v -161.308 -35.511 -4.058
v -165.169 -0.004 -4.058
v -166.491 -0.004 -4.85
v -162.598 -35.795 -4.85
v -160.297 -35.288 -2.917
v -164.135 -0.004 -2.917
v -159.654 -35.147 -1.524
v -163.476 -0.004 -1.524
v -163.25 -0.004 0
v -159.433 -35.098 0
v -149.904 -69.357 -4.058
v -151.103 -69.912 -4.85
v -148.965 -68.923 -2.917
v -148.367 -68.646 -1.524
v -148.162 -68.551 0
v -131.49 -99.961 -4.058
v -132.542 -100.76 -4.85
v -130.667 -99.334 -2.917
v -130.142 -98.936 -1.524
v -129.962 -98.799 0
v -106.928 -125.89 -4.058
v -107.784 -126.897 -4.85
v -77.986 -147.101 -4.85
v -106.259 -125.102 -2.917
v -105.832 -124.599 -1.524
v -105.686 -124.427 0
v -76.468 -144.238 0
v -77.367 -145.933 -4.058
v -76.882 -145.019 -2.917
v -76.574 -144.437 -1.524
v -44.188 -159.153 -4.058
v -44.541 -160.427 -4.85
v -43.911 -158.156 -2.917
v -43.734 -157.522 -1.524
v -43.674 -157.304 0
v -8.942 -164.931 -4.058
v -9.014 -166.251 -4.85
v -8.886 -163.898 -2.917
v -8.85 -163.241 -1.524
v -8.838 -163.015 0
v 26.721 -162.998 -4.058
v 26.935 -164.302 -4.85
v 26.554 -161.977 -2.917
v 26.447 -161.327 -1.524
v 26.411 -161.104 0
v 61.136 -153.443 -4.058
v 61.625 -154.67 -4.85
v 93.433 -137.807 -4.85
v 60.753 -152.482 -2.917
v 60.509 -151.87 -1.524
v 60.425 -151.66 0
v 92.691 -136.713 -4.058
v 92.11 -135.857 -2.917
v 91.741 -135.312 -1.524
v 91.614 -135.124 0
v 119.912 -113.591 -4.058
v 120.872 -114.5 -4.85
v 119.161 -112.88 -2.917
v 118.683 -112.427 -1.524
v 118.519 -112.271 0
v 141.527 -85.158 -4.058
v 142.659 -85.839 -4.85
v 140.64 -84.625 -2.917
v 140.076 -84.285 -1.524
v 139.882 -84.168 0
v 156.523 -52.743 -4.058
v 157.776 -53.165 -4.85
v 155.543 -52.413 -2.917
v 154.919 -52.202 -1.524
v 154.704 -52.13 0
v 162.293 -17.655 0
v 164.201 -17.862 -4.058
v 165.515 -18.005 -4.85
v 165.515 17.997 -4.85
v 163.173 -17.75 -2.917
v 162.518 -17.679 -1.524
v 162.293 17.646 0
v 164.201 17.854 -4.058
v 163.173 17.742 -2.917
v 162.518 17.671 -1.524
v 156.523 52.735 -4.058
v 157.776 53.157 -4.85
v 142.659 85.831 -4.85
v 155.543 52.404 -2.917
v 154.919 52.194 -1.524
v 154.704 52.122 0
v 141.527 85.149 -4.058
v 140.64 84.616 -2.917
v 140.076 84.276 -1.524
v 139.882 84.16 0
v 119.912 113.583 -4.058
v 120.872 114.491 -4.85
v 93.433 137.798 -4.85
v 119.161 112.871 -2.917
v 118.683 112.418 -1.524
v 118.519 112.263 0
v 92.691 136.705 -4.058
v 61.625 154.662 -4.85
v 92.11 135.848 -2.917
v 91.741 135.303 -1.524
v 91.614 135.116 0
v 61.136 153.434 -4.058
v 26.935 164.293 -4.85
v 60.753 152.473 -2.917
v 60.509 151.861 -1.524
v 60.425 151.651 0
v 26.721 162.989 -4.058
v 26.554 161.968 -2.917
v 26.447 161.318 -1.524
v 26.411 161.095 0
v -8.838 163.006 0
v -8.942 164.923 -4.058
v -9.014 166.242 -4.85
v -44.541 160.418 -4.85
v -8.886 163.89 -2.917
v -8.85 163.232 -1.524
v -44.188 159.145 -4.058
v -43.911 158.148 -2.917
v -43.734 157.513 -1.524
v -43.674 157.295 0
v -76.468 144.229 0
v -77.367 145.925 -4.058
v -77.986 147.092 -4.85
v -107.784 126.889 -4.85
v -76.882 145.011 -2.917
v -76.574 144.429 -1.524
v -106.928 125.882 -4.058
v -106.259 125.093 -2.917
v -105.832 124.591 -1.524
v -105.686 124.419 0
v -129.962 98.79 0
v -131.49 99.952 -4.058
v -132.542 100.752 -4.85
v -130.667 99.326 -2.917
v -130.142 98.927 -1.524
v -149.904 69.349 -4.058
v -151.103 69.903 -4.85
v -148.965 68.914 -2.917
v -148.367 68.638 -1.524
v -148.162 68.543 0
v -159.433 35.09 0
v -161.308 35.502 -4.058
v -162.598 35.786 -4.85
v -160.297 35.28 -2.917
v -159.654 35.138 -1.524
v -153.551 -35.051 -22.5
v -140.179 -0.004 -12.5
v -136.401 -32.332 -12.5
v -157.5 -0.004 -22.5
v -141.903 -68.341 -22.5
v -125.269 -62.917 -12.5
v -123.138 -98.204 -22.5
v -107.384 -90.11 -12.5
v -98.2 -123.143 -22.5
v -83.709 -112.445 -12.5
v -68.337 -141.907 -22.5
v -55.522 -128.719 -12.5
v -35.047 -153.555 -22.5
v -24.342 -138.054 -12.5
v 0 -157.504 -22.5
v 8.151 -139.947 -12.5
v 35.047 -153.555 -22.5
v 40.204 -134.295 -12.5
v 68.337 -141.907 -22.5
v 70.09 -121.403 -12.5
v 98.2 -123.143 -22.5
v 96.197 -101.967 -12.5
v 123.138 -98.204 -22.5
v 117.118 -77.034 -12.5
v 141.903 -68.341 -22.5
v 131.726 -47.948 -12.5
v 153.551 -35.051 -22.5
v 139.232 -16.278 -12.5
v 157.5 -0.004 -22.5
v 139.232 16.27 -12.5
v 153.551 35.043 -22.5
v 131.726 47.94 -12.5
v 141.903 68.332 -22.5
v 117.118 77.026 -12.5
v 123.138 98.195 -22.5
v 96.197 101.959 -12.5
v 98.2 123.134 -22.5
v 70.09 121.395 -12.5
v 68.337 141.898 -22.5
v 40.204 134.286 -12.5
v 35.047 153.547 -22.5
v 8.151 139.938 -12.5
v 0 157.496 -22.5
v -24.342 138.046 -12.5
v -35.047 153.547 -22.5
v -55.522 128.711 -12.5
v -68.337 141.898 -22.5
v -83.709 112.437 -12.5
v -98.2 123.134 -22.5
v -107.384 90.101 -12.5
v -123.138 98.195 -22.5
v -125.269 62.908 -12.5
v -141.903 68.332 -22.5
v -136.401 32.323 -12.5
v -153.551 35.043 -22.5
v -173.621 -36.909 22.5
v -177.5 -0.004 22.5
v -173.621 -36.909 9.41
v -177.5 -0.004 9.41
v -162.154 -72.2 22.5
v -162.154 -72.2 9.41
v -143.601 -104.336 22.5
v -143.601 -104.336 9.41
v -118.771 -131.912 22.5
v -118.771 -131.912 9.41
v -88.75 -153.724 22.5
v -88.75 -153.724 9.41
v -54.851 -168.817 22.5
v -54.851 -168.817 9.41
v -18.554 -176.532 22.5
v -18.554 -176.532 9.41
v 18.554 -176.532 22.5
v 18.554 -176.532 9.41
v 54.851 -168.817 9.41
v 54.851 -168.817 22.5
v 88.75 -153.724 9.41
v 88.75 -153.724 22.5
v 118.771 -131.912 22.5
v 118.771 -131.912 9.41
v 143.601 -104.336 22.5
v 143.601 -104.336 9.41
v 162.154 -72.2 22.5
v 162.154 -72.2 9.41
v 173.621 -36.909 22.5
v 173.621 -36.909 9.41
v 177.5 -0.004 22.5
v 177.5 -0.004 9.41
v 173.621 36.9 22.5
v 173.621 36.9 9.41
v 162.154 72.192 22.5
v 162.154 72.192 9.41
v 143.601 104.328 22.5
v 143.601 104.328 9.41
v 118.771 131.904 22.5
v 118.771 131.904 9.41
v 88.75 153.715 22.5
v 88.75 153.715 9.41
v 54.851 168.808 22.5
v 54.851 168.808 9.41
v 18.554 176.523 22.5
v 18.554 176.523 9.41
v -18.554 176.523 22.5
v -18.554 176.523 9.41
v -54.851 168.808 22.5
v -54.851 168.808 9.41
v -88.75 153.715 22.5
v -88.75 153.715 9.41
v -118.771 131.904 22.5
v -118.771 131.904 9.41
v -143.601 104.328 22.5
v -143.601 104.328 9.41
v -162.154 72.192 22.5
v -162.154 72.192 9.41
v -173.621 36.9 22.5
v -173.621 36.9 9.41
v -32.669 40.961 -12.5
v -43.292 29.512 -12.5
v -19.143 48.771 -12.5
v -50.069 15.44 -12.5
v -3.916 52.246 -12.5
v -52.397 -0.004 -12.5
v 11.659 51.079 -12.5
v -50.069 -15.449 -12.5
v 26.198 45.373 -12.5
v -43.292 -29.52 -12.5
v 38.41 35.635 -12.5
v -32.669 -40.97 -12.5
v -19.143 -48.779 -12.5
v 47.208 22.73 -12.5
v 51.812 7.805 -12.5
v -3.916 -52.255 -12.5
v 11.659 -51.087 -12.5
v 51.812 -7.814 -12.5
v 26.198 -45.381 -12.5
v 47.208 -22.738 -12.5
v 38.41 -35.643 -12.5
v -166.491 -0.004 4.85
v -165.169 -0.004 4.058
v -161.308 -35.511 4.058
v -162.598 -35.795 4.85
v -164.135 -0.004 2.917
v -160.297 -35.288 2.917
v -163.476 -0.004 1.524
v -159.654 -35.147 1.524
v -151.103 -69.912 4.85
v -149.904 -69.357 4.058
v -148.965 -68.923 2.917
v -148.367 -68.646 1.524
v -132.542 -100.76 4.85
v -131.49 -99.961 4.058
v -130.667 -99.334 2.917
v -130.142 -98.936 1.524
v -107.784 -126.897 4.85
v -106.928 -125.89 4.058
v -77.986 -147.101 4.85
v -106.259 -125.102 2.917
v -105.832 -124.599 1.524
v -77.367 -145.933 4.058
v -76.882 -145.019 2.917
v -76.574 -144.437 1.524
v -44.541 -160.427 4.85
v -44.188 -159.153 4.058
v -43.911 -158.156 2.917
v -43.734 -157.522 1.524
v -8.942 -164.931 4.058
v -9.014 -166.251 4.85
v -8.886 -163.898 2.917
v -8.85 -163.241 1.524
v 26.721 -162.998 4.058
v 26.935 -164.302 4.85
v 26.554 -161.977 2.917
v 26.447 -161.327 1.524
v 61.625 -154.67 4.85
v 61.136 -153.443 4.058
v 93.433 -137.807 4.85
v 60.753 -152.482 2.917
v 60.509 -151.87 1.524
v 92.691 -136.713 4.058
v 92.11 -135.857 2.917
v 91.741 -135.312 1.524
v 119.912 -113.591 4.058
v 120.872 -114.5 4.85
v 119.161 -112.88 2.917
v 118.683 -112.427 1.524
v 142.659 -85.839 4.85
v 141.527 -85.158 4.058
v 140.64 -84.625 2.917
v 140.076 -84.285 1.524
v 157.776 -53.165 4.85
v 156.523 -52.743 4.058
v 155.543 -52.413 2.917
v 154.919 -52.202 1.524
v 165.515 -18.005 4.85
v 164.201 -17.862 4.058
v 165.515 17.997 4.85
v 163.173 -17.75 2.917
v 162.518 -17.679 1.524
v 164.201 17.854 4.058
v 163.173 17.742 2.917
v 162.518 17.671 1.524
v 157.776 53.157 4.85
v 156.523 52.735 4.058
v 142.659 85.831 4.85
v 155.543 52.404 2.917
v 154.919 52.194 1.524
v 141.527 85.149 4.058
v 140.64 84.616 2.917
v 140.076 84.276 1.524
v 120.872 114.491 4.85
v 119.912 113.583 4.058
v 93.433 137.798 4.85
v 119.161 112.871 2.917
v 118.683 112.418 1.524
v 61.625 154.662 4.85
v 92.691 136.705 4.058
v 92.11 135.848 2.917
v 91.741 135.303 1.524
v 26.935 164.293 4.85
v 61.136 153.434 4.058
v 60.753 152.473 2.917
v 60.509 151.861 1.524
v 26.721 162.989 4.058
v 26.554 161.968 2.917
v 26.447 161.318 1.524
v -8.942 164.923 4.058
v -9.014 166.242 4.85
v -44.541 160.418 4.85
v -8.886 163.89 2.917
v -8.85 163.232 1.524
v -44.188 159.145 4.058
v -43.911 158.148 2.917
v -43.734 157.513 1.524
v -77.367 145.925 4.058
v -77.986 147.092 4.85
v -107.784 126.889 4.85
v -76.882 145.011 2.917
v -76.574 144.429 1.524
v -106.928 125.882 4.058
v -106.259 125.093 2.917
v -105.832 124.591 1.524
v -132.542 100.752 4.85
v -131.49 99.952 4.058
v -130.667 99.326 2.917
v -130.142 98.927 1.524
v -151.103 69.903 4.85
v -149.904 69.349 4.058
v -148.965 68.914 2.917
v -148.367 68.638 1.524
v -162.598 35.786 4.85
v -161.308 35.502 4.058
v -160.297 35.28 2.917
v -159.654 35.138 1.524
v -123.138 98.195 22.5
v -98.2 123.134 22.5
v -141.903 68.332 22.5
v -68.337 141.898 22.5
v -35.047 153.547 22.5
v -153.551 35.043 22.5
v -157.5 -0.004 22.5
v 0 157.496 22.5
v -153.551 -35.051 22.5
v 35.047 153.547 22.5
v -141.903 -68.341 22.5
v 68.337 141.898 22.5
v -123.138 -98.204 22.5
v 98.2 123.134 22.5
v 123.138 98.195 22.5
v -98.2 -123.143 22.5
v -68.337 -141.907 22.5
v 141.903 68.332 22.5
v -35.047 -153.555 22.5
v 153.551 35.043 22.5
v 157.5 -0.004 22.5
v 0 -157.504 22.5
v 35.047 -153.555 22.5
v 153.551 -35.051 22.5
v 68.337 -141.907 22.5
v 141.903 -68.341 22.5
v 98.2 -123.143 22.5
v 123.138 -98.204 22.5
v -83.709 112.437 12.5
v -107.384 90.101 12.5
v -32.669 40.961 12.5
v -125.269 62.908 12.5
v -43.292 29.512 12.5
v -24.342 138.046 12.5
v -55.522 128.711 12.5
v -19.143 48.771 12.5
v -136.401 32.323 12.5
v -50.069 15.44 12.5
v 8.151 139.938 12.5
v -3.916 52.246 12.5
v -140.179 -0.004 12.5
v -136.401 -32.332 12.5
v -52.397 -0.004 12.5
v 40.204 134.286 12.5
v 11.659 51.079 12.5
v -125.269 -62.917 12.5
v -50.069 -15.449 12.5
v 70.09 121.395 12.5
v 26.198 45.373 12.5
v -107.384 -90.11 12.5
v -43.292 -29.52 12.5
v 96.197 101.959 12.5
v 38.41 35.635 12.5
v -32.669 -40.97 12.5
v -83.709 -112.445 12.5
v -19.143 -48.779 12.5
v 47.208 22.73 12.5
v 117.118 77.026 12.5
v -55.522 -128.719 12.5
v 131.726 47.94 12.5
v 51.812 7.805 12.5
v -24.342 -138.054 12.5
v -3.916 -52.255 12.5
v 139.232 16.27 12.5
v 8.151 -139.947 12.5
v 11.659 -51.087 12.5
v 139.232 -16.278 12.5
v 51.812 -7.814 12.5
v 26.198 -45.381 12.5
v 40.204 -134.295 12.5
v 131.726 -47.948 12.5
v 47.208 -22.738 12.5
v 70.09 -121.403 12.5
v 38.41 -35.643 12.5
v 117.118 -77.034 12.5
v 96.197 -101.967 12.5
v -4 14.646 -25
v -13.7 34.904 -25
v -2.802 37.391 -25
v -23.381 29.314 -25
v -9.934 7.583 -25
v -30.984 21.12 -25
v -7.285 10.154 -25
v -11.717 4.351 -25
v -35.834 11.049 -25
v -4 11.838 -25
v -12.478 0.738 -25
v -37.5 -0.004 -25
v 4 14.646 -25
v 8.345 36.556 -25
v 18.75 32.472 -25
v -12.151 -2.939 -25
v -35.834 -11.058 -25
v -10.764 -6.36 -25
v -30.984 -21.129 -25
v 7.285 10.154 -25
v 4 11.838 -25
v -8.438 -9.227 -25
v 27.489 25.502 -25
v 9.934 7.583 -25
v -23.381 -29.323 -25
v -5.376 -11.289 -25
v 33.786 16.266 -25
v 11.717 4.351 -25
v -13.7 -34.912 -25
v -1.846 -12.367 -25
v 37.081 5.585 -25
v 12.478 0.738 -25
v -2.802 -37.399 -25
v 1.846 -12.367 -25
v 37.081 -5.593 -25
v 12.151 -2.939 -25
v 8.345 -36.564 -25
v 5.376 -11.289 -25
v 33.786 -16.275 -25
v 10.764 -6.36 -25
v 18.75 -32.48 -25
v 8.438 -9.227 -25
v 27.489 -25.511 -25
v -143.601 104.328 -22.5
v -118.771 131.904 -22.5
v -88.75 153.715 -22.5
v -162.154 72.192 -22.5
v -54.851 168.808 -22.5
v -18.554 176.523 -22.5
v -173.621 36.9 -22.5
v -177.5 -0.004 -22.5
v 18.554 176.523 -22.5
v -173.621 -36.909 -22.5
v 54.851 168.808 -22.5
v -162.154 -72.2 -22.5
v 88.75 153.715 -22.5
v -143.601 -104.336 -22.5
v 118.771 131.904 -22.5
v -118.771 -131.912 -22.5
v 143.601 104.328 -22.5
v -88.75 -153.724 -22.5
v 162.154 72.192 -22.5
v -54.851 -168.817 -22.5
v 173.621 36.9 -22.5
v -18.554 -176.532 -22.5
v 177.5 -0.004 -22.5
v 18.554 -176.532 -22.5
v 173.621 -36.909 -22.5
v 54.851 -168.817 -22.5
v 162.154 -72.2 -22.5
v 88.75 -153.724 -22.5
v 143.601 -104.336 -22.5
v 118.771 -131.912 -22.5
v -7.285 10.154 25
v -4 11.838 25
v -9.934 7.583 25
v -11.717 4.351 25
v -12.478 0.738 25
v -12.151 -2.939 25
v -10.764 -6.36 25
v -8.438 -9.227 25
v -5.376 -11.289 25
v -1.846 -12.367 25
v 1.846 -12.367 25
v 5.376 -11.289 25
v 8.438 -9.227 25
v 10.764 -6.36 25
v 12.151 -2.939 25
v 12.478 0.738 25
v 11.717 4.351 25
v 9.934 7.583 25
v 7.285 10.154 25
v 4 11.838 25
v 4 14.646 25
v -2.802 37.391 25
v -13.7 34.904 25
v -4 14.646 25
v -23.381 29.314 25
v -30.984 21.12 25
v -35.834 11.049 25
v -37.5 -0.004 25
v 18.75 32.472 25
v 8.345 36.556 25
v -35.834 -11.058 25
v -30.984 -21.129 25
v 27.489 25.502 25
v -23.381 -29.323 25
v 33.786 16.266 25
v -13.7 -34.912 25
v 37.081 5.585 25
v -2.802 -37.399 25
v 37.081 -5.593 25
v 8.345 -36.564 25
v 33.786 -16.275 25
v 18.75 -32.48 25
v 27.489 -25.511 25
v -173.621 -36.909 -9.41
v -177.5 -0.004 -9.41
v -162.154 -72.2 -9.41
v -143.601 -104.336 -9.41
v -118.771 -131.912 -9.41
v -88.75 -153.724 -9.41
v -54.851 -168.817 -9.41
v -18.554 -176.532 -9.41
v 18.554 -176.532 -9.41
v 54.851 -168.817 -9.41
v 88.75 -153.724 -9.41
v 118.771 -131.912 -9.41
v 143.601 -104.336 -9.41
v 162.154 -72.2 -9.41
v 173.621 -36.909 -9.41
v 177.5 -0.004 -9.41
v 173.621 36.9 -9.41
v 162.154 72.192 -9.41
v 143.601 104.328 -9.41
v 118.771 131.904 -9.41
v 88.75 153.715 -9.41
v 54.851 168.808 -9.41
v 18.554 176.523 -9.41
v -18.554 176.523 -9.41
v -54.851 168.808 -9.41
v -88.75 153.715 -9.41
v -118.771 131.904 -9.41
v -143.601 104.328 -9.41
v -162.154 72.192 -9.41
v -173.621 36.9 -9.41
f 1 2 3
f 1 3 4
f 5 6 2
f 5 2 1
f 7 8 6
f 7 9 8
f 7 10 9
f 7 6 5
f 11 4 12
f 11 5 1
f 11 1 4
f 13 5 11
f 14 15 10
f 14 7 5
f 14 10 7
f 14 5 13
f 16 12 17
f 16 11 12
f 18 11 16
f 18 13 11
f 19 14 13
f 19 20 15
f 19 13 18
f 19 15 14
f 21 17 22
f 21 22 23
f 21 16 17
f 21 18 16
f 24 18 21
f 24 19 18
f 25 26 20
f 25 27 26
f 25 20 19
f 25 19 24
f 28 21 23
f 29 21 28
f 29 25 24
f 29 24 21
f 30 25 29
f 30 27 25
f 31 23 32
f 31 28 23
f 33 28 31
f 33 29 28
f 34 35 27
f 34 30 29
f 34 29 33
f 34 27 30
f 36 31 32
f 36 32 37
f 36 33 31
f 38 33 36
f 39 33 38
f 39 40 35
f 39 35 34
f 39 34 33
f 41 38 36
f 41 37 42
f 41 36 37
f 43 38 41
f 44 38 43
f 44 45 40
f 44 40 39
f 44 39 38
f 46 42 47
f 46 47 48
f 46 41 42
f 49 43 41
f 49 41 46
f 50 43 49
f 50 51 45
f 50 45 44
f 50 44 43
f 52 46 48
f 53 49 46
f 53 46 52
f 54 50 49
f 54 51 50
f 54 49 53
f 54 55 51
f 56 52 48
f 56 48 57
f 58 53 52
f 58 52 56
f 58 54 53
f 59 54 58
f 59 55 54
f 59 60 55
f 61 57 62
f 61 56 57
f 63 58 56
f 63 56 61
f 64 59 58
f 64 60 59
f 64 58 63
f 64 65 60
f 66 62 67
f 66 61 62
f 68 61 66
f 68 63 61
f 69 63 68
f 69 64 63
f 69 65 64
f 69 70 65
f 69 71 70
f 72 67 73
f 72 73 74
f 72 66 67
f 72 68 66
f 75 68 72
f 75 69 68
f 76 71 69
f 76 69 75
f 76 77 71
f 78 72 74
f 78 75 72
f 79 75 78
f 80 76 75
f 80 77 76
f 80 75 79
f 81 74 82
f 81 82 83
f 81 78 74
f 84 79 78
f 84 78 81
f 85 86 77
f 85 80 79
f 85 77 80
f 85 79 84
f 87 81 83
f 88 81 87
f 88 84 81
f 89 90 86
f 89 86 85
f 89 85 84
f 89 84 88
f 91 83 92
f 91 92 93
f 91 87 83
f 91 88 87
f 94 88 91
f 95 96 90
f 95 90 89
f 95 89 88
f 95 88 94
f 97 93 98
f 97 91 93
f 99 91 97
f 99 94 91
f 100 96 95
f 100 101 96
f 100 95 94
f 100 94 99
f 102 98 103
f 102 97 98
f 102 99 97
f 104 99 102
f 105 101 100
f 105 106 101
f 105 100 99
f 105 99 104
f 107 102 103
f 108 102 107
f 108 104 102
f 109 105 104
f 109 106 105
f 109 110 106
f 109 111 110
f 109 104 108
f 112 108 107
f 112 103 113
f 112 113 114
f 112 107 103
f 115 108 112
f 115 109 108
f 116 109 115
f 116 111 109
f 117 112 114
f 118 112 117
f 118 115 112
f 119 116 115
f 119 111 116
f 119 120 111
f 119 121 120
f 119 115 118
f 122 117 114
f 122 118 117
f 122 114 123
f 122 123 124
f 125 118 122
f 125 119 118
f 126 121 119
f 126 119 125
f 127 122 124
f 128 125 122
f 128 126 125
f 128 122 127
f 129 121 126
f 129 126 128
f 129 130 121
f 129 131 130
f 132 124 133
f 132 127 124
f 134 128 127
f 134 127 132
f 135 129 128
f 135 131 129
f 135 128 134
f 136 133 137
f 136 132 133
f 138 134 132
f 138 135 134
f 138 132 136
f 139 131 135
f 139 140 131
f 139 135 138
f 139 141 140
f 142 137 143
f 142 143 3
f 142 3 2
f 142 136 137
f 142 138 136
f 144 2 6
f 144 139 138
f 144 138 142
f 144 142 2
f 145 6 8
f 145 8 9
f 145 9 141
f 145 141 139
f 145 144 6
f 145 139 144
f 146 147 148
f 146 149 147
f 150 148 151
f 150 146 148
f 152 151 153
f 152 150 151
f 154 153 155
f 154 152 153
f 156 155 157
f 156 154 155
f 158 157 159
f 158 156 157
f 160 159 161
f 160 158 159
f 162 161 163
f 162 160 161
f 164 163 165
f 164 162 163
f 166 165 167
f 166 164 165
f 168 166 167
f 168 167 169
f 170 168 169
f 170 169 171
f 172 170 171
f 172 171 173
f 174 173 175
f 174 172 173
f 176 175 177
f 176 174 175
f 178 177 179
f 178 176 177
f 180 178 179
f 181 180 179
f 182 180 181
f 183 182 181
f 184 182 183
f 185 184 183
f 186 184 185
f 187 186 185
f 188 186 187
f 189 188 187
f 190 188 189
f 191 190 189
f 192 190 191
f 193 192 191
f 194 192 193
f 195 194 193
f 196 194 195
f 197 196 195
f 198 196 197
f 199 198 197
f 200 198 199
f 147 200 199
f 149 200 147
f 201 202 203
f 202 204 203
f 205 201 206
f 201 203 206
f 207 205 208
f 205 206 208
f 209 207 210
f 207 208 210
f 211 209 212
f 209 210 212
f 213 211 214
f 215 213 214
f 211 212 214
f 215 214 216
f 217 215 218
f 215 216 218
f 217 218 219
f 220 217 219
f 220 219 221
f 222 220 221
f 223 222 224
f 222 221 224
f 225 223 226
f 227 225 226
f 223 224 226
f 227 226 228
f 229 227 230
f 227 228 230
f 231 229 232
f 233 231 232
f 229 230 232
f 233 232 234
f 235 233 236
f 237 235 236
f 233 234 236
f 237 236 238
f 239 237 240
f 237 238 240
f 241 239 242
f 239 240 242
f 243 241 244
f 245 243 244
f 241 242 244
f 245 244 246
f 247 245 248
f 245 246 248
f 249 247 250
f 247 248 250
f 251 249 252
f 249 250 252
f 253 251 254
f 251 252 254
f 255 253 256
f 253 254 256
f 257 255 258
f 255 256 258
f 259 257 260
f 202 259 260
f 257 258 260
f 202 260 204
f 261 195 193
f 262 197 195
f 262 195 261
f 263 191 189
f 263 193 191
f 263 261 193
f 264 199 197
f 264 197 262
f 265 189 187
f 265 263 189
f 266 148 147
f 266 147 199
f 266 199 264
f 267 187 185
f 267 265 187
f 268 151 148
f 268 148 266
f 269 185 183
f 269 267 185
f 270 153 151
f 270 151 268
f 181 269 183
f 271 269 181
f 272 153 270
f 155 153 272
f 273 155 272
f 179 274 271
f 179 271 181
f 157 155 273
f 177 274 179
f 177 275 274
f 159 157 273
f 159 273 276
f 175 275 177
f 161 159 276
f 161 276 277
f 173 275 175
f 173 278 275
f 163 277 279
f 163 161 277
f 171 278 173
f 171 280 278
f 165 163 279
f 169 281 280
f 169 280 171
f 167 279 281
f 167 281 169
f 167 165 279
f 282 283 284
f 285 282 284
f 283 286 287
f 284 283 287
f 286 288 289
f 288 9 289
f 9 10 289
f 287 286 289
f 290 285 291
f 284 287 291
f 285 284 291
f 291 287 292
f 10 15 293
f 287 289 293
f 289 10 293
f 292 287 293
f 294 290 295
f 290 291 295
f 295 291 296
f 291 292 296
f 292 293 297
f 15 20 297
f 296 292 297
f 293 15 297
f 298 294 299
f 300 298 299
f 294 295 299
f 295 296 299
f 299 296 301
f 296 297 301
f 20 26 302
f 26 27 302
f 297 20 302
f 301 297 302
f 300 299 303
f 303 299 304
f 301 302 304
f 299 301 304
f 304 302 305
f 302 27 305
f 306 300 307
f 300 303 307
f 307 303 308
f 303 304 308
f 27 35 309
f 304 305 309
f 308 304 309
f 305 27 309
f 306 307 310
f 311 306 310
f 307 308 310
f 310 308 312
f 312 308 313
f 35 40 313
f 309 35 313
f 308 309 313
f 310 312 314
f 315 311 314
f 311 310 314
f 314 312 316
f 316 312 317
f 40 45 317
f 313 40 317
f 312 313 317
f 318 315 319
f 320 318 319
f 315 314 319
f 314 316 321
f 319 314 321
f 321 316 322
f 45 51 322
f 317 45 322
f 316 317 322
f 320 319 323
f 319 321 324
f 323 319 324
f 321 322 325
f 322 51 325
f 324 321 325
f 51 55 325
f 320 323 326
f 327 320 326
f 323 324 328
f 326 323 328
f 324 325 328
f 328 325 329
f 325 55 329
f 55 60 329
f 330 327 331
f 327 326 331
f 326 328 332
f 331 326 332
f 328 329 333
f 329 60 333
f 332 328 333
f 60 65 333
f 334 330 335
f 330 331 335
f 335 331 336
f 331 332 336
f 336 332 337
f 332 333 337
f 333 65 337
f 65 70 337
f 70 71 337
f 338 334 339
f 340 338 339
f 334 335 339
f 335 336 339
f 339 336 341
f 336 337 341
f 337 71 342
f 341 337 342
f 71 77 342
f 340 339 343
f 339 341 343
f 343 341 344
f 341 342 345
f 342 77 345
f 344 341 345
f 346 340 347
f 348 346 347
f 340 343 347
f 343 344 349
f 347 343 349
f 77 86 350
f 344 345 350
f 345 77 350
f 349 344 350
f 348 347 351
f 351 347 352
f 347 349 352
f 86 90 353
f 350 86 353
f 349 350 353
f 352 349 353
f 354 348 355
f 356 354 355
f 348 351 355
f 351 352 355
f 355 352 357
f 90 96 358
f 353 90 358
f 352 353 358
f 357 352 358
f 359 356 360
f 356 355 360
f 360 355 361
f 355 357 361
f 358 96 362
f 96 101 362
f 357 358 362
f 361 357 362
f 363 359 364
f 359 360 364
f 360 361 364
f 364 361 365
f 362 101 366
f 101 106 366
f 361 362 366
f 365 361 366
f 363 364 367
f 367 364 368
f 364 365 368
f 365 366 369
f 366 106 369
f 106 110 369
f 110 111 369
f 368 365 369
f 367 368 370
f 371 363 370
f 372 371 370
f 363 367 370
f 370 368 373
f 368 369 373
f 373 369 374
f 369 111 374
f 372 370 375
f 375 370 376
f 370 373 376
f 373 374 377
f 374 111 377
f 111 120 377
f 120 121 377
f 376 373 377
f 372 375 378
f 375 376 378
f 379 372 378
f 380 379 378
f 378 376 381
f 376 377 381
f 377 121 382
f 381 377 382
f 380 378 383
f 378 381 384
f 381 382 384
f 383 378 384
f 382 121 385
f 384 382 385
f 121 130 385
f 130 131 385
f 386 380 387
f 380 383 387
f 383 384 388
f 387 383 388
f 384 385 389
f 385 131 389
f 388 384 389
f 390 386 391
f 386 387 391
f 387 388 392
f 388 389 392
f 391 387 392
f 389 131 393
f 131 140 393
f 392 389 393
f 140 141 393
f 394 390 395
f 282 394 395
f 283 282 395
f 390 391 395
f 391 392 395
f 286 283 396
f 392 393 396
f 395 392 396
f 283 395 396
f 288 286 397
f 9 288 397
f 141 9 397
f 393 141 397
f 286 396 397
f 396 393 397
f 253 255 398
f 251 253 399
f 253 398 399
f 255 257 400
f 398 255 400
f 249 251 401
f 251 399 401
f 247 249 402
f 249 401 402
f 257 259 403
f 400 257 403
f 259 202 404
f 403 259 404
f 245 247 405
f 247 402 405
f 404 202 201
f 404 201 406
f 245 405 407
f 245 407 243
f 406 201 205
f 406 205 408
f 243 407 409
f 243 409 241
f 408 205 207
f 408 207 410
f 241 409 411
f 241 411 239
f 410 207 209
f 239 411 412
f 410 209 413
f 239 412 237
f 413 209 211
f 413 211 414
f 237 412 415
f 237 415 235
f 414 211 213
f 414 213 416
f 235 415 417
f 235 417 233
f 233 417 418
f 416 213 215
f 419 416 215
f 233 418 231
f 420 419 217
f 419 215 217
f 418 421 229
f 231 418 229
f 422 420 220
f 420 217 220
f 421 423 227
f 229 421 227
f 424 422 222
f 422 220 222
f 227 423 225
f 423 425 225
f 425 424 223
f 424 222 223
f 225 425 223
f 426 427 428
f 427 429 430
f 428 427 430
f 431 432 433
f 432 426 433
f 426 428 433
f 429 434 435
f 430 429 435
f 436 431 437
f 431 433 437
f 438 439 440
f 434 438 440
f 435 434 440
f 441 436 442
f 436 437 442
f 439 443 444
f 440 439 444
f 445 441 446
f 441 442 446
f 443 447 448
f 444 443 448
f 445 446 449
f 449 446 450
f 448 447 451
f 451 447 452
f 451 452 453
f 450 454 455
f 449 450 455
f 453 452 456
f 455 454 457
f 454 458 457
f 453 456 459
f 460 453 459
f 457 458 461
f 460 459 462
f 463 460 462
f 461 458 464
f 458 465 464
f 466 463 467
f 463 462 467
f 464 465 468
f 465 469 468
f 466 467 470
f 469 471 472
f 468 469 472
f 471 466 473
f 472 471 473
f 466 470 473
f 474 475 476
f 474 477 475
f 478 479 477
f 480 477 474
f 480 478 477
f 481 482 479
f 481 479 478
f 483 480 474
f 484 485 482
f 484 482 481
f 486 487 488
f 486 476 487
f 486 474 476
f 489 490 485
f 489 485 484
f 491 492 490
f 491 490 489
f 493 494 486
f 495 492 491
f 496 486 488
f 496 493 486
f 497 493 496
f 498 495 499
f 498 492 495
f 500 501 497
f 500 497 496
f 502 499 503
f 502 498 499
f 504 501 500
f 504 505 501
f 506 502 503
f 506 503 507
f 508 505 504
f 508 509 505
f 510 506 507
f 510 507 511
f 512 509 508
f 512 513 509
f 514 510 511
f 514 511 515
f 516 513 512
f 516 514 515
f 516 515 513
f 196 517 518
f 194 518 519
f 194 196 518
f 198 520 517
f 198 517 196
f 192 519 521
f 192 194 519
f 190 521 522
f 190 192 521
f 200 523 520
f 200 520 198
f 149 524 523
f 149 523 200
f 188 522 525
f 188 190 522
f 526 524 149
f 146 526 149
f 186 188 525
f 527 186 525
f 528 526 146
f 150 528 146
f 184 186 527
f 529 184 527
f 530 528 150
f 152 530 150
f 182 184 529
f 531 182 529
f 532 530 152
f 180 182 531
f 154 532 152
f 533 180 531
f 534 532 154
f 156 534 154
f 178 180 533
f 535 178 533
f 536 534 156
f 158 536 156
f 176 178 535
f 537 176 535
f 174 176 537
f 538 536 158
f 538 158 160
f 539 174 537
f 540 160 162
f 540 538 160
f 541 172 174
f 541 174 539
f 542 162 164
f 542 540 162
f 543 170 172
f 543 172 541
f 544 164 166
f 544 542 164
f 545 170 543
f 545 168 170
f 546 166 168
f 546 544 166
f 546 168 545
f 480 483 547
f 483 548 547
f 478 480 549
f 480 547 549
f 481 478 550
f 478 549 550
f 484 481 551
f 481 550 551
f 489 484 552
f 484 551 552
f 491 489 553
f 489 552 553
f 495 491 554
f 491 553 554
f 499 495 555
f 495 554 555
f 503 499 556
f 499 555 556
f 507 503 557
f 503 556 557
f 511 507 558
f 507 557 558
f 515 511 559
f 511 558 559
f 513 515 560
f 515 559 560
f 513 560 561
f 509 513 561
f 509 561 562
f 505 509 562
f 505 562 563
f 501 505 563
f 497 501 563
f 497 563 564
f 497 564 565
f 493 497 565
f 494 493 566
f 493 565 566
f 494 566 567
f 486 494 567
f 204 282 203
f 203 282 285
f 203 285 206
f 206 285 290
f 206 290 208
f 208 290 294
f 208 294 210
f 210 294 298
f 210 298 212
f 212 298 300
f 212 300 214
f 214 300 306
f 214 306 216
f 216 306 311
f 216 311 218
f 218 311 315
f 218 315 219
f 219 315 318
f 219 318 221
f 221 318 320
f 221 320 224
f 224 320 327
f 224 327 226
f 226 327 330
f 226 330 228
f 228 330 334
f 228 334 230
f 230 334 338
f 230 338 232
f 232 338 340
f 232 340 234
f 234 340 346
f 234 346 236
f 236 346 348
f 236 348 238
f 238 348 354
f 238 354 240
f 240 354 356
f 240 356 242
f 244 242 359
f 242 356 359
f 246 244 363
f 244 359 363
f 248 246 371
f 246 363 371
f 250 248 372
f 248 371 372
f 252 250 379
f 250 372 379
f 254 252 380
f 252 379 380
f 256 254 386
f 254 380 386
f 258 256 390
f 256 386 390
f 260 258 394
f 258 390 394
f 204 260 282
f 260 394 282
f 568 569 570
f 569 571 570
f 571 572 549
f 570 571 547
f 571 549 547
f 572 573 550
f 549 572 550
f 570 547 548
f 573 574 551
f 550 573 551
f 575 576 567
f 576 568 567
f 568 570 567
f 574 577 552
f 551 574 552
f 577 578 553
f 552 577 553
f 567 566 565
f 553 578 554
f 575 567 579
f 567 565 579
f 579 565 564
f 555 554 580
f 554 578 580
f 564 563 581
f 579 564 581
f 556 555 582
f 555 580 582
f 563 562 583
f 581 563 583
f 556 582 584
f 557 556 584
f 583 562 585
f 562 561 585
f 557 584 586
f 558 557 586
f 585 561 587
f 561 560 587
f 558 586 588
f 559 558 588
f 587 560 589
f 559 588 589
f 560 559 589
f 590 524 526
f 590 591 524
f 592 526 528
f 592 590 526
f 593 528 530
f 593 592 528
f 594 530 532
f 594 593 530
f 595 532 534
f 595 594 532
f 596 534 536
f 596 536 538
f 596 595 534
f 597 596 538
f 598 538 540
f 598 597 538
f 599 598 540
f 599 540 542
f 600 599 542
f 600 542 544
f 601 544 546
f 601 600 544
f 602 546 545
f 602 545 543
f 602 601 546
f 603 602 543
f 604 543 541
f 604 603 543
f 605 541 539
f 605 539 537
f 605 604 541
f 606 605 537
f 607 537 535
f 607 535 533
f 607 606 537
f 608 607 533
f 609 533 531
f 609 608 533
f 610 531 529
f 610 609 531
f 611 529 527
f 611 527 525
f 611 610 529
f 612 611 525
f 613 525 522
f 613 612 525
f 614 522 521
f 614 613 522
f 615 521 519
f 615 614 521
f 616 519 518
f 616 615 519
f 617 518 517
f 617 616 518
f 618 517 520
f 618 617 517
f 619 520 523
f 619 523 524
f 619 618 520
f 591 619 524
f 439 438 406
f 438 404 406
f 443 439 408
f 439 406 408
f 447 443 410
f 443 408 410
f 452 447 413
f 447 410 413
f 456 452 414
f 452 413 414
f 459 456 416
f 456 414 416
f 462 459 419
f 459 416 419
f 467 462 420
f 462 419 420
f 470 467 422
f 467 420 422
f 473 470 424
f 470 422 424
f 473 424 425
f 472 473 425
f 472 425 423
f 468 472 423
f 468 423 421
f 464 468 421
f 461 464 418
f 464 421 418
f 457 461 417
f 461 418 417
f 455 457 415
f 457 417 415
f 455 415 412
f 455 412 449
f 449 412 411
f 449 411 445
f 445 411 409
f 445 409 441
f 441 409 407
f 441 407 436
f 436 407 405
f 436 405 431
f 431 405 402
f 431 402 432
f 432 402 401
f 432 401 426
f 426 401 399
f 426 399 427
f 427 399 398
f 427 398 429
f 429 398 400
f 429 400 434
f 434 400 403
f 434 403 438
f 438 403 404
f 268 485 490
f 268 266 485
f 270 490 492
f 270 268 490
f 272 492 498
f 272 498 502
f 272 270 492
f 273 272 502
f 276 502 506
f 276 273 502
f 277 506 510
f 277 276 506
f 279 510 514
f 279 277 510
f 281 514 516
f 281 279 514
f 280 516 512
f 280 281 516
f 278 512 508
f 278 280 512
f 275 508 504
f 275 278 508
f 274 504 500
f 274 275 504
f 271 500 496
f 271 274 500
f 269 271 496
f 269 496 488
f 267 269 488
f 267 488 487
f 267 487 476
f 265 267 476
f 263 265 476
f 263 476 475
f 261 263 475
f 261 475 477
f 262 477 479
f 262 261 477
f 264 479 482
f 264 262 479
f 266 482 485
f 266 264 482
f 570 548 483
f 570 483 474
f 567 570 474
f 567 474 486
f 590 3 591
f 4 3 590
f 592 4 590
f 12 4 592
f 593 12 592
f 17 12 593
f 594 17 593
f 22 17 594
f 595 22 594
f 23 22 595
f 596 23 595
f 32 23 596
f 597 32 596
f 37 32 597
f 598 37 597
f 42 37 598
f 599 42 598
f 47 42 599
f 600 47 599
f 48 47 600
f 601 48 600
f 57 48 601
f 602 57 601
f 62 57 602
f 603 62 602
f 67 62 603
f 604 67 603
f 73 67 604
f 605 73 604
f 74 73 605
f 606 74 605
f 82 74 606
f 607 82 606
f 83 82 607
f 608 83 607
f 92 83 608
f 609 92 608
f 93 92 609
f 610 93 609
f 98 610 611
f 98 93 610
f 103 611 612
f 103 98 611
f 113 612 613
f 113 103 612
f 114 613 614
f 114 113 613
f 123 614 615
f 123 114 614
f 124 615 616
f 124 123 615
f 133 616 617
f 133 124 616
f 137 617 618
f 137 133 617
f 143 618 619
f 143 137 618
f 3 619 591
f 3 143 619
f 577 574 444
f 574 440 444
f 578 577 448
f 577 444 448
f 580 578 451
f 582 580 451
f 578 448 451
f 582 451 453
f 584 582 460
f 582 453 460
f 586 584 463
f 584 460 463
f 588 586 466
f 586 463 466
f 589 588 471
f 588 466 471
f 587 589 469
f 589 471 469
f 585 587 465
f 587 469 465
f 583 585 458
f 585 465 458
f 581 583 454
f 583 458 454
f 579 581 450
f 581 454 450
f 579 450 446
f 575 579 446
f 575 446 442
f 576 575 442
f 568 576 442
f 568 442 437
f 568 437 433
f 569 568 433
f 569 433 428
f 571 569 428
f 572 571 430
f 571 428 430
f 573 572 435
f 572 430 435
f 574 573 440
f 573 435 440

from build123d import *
from build123d.topology import SkipClean

# Parameters (mm, degrees)
ESQUISSE2_R             = 25
ENL_V_MAT_EXTRU_1_DEPTH = 512.908194894
ESQUISSE3_W             = 16
ESQUISSE3_H             = 8.6
ENL_V_MAT_EXTRU_2_DEPTH = 512.908194894
ECHELLE1_SCALE          = 0.5


with BuildPart() as part:
    # Esquisse1 → Révolution1 (revolve)
    with BuildSketch(Plane(origin=(0, 0, 0), x_dir=(0, 0, -1), z_dir=(1, 0, 0)), mode=Mode.PRIVATE) as r_volution1_sk:
        with BuildLine():
            Line((0, 0), (-50, 0))
            Line((-50, 0), (-50, 75))
            Line((-50, 75), (-25, 104.793839815))
            Line((-25, 104.793839815), (-25, 280.358983849))
            Line((-25, 280.358983849), (-45, 315))
            Line((-45, 315), (-45, 355))
            Line((-45, 355), (-18.820962226, 355))
            Line((-18.820962226, 355), (-9.700735091, 332.98182396))
            ThreePointArc((-9.700735091, 332.98182396), (-5.833487447, 328.269569071), (0, 326.5))
            Line((0, 326.5), (0, 0))
        make_face()
    r_volution1 = revolve(r_volution1_sk.sketch.rotate(Axis((0, 0, 0), (0, 0, 1)), 90), axis=Axis((0, 0, 0), (0, 0, 1)))

    # Symétrie1: Révolution1 across plane
    with SkipClean():  # the faces are left unmerged after this step: merging them gives an invalid solid
        add(r_volution1.mirror(Plane(origin=(0, 326.5, 0), x_dir=(1, 0, 0), z_dir=(0, 0, -1))))

    # Esquisse2 → Enlèv. mat.-Extru.1 (cut, through all)
    with SkipClean():  # the faces are left unmerged after this step: merging them gives an invalid solid
        with BuildSketch(Plane.XY.offset(50)):
            Circle(ESQUISSE2_R)
        extrude(amount=-ENL_V_MAT_EXTRU_1_DEPTH, mode=Mode.SUBTRACT)

    # Esquisse3 → Enlèv. mat.-Extru.2 (cut, through all)
    with SkipClean():  # the faces are left unmerged after this step: merging them gives an invalid solid
        with BuildSketch(Plane.XY.offset(50)):
            with Locations((0, 25)):
                Rectangle(ESQUISSE3_W, ESQUISSE3_H)
        extrude(amount=-ENL_V_MAT_EXTRU_2_DEPTH, mode=Mode.SUBTRACT)


with BuildPart() as part_1:
    # Echelle1: scaled about (0, -0.00849014, 0)
    add(part.part.scale(ECHELLE1_SCALE).moved(Location((0, -0.00424507, 0))))


solid = part_1.part
